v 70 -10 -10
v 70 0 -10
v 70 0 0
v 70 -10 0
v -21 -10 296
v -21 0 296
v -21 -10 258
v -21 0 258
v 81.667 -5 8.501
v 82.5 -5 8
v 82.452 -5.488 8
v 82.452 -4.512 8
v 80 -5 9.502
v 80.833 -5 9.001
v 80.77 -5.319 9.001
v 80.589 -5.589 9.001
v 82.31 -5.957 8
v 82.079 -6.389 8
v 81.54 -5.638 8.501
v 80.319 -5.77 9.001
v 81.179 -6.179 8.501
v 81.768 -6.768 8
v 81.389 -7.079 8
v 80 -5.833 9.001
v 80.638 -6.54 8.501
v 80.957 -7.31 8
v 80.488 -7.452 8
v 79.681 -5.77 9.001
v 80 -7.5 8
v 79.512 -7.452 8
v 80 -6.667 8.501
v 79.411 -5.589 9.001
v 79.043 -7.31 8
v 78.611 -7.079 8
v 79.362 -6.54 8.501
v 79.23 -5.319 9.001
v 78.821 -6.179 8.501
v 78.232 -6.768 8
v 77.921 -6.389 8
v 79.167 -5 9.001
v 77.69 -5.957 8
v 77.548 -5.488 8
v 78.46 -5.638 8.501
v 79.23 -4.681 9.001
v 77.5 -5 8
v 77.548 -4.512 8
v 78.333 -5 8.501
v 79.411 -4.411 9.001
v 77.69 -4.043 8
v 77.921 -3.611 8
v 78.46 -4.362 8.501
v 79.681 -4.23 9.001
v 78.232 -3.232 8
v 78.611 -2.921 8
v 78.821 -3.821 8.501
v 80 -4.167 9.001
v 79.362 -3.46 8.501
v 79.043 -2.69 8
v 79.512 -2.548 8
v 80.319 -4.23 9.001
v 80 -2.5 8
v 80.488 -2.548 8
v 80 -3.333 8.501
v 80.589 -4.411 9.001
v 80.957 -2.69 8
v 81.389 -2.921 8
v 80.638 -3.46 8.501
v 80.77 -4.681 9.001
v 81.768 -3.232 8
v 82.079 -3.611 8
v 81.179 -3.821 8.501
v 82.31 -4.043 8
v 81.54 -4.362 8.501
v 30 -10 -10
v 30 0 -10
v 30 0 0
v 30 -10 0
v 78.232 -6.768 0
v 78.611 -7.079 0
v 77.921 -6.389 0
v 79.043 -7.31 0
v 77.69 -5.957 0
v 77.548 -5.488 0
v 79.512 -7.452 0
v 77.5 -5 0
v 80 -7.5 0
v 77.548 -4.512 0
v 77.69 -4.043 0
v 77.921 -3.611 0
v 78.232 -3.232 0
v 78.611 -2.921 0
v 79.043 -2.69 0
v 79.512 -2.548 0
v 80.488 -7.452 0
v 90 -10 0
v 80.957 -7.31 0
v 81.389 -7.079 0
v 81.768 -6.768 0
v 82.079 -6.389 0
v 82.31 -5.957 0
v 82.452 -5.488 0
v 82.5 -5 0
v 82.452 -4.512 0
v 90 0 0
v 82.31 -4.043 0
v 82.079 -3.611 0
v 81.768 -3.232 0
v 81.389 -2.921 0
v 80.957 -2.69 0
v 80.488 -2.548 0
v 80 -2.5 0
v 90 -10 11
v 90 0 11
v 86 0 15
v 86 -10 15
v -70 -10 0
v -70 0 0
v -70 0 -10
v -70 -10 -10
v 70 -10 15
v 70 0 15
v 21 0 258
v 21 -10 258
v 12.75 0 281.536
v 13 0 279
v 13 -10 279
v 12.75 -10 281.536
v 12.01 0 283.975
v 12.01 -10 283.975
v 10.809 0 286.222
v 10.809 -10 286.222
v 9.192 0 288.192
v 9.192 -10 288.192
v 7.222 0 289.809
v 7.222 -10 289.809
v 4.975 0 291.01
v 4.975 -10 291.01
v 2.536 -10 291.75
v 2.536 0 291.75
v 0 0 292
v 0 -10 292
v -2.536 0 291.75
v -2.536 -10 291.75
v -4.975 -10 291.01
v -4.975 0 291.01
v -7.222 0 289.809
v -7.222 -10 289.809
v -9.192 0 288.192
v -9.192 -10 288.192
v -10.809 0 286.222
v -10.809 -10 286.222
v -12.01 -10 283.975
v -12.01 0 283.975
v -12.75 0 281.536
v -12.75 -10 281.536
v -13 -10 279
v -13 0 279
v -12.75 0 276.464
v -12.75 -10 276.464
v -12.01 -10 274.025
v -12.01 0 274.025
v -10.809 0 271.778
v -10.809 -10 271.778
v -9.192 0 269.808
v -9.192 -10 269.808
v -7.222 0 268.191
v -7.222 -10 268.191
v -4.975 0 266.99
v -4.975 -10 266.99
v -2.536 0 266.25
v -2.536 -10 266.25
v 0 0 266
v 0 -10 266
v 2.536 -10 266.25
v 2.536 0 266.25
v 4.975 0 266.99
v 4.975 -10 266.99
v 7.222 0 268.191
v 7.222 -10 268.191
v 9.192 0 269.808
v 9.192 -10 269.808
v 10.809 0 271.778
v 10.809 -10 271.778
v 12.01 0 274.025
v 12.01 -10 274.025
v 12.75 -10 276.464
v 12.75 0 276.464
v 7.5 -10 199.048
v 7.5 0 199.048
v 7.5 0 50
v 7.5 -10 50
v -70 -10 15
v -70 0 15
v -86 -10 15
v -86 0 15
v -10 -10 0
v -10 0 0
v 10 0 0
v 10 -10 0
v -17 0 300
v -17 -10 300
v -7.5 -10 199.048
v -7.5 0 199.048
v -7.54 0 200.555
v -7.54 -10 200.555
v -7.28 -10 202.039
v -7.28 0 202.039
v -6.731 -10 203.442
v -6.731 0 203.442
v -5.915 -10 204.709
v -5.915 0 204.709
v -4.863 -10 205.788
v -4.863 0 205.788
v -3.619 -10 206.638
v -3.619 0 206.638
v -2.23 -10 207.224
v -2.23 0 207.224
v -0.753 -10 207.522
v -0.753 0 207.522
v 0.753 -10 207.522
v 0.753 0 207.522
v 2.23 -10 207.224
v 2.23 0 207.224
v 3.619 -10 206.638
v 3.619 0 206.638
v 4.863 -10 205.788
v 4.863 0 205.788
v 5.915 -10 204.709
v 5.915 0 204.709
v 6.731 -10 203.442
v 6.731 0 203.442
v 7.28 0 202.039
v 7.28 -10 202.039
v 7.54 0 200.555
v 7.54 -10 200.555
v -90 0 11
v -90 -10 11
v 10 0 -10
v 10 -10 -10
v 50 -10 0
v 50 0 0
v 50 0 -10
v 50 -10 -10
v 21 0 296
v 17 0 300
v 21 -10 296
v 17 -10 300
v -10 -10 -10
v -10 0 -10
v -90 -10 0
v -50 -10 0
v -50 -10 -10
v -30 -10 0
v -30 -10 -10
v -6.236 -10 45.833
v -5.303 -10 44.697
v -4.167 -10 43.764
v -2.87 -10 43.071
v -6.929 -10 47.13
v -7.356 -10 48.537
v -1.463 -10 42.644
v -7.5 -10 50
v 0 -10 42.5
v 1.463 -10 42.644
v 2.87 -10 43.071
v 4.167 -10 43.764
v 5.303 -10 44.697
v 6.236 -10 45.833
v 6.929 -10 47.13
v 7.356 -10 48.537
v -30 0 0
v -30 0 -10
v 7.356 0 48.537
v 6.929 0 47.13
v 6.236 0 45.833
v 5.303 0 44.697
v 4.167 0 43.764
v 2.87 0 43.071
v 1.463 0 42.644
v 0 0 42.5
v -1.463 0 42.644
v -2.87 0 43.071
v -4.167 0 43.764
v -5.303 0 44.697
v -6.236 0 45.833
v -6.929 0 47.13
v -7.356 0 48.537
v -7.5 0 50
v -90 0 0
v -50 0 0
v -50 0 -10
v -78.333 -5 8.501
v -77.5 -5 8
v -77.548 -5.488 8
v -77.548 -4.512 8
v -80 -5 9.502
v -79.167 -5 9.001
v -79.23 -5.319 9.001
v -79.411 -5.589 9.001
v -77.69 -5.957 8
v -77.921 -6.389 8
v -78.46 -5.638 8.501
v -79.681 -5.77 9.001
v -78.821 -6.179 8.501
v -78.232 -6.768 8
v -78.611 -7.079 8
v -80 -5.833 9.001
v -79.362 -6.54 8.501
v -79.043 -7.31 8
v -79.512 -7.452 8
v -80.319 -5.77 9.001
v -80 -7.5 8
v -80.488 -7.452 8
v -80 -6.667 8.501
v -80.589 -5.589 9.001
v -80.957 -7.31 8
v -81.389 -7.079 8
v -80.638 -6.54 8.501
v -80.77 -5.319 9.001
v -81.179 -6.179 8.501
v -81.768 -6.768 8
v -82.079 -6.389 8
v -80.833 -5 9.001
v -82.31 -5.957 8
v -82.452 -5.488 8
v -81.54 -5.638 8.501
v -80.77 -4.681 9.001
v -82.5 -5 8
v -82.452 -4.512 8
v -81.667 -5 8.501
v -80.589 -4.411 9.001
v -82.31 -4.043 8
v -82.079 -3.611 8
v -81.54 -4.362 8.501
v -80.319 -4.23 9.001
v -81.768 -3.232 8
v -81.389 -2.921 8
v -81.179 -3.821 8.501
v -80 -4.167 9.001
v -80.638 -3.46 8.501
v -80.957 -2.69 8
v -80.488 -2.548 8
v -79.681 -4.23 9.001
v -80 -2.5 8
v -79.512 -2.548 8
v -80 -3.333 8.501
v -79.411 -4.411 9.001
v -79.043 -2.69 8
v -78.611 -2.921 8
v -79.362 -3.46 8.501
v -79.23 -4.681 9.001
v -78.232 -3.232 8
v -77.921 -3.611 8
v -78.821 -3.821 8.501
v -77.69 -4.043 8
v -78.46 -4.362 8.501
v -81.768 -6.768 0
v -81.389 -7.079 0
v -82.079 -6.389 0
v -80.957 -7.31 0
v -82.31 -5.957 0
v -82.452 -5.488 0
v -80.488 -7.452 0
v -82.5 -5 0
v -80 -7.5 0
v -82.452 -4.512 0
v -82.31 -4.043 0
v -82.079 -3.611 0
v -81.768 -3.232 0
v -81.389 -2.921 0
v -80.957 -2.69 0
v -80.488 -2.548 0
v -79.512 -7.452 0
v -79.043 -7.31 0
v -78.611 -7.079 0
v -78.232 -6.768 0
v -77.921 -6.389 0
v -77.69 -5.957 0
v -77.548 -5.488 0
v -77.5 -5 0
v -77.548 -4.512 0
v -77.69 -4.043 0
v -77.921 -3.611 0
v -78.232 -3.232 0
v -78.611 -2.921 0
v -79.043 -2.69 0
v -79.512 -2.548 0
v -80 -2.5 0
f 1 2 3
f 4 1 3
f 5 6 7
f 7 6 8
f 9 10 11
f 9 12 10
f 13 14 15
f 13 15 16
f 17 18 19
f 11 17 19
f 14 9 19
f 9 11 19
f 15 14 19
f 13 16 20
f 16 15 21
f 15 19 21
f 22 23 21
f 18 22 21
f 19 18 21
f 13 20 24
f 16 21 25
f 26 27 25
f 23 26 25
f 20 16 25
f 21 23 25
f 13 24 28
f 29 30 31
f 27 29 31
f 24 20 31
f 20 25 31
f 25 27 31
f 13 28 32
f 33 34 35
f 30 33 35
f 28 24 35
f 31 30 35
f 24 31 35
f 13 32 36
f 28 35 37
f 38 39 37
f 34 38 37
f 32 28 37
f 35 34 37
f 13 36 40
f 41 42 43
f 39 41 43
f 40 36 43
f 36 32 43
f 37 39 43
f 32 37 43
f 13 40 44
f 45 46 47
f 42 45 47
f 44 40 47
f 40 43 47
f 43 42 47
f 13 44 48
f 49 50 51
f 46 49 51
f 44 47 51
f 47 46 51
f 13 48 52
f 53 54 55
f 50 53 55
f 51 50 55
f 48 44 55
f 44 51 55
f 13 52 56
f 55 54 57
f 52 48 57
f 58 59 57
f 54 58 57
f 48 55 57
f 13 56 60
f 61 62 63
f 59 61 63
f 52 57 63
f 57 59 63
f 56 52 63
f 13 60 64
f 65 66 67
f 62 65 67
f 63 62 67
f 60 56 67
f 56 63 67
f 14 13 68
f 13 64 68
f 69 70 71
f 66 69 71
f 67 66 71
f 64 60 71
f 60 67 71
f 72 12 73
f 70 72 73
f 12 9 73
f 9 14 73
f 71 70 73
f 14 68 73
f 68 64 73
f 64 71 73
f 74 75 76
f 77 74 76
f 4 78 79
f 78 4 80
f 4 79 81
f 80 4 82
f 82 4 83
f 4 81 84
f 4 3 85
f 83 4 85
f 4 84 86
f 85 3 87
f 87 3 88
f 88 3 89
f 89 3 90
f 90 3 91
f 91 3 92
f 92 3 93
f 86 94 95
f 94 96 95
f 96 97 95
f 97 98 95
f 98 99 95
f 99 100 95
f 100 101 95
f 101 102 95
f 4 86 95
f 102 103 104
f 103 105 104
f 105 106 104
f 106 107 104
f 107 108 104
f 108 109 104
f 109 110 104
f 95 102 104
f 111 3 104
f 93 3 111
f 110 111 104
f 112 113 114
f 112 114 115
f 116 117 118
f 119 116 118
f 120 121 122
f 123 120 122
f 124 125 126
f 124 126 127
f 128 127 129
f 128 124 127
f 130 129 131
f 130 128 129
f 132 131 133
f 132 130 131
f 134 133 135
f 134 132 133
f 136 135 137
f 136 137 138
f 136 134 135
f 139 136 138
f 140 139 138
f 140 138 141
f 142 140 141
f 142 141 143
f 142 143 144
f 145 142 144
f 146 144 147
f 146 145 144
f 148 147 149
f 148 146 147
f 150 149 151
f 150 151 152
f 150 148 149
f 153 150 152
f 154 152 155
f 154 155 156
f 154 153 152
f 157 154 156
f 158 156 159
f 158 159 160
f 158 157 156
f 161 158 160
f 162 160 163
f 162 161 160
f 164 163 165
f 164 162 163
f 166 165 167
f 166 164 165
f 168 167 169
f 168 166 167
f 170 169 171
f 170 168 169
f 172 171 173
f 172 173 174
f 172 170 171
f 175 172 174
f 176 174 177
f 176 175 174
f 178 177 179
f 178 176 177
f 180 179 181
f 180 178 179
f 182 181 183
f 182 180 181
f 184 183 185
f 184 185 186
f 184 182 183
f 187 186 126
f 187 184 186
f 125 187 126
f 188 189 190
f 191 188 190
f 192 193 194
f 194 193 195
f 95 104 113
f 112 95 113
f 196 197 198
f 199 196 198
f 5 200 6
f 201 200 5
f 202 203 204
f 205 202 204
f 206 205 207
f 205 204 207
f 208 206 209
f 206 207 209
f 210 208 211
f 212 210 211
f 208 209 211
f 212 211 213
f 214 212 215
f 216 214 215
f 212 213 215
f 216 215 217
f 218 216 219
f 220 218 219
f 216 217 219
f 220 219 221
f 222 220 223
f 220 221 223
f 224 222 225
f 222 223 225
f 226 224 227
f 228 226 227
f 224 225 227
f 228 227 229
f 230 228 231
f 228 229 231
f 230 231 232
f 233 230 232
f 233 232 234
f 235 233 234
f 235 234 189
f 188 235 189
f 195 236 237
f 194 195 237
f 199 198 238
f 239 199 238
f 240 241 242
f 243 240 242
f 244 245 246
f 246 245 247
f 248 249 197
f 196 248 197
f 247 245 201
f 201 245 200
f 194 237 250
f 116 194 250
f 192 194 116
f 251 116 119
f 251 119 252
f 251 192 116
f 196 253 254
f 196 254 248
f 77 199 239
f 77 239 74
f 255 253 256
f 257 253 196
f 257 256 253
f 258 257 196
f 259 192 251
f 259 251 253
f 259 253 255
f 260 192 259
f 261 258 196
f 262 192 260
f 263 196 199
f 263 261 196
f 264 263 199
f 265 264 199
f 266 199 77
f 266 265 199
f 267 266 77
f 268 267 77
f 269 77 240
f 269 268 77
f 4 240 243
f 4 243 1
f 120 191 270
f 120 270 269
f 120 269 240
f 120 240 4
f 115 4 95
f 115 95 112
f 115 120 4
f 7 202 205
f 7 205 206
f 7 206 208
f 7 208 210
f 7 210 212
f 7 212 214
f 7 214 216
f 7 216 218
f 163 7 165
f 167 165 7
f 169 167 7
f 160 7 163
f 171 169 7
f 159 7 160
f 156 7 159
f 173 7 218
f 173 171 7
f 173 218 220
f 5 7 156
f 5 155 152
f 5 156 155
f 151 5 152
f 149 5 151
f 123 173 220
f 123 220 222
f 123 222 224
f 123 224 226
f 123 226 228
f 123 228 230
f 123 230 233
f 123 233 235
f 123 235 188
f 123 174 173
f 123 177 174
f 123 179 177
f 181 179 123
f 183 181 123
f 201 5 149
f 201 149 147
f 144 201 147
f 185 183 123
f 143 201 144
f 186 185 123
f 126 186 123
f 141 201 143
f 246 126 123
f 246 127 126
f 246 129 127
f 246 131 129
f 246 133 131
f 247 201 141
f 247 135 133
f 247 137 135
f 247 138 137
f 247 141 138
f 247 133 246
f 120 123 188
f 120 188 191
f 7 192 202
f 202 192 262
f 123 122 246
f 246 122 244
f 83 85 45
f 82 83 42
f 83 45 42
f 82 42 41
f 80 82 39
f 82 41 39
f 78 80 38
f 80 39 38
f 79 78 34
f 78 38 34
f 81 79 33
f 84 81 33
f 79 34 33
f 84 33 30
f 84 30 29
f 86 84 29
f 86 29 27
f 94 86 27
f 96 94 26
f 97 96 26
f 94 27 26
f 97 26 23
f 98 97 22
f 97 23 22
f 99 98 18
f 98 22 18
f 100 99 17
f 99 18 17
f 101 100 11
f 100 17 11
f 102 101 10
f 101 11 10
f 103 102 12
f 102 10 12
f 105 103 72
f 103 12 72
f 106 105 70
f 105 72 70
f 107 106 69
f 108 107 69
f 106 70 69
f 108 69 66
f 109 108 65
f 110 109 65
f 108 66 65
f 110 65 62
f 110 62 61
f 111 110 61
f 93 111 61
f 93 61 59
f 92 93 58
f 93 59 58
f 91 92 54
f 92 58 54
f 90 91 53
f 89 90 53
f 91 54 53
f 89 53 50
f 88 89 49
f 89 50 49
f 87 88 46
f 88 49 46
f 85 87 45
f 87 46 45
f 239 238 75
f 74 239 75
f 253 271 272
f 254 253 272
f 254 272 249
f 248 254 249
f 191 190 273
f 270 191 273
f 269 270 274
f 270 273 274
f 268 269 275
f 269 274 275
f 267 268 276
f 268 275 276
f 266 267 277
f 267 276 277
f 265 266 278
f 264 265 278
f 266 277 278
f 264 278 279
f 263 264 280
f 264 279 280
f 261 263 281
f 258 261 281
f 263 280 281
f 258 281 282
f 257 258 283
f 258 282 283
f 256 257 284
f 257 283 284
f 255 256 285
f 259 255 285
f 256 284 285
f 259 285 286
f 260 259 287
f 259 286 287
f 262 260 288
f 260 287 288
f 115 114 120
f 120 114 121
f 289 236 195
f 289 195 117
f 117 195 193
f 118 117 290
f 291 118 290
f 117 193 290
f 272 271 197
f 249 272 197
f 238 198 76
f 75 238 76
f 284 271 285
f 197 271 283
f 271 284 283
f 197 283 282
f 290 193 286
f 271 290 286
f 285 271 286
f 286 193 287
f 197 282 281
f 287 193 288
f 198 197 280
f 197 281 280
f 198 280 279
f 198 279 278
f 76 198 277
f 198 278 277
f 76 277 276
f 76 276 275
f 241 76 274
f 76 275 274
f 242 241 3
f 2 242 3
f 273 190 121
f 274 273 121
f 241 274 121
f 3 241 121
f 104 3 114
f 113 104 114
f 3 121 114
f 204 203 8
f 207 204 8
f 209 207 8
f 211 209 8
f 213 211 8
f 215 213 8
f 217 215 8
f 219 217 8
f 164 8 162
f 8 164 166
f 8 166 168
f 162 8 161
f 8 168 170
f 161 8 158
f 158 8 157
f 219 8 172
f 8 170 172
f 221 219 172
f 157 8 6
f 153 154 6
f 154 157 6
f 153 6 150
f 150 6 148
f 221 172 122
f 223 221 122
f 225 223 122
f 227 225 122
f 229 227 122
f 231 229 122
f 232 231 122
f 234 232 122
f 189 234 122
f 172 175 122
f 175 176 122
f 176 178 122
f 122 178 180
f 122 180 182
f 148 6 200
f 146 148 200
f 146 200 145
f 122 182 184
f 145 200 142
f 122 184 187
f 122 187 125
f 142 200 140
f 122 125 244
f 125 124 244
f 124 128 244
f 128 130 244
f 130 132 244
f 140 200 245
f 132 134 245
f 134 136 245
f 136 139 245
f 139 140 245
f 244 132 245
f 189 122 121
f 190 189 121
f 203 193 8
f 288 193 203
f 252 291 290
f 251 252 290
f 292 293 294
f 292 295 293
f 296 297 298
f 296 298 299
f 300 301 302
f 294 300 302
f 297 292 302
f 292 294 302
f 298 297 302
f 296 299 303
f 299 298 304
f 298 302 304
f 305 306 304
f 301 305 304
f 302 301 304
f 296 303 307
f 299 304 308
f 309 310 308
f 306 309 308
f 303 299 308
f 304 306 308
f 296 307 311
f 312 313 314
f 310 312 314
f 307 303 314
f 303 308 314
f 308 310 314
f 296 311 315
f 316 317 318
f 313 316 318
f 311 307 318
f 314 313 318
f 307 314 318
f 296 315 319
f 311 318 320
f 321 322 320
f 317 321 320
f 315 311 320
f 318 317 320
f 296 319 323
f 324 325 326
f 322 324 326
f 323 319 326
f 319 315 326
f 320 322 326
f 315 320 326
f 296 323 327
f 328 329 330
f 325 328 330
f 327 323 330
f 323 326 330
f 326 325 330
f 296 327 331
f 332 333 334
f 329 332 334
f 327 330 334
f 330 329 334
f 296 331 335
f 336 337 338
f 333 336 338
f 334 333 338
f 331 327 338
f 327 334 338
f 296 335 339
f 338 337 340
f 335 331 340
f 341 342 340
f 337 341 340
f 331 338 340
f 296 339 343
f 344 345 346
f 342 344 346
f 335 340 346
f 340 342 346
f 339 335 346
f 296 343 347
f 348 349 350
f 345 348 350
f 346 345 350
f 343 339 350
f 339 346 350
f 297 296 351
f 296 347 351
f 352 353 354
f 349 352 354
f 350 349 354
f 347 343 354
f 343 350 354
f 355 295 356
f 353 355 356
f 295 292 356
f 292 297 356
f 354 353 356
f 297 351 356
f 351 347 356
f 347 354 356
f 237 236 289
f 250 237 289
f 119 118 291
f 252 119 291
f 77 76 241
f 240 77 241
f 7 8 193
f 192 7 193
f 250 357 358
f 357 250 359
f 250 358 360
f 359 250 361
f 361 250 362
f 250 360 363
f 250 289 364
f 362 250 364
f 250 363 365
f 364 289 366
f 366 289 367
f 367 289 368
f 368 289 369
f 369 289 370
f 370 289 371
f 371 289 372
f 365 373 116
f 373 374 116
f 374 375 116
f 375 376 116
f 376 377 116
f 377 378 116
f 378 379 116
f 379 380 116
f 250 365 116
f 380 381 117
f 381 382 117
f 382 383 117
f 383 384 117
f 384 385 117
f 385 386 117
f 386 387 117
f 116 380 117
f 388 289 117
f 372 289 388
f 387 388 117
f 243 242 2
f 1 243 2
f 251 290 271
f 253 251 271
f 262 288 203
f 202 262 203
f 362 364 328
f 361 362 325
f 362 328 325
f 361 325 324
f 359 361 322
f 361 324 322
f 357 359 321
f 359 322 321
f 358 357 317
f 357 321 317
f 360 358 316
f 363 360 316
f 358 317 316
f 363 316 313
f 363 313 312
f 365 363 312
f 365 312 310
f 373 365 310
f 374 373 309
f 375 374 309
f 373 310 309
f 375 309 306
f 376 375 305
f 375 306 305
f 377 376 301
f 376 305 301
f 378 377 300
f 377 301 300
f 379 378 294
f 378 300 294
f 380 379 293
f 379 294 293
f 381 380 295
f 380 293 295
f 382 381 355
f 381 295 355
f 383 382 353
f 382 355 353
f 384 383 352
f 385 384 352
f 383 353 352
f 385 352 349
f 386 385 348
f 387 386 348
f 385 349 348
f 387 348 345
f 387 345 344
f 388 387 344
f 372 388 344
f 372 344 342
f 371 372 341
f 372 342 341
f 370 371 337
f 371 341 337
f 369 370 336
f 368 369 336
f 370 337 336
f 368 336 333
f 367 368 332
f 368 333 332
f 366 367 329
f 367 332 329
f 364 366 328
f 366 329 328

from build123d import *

# Parameters (mm, degrees)
F0_R     = 13
F1_DEPTH = 10
F2_SIZE  = 4
F3_SIZE  = 4
F5_D     = 5
F5_DEPTH = 8
F5_TIP   = 1.5021515476


with BuildPart() as f1:
    # F0 (on Front) → F1 (new body)
    with BuildSketch(Plane.XZ):
        Polygon((-10, 0), (0, 0), (10, 0), (10, -10), (30, -10), (30, 0), (50, 0), (50, -10), (70, -10), (70, 0), (90, 0), (90, 15), (70, 15), (21, 258), (21, 300), (0, 300), (-21, 300), (-21, 258), (-70, 15), (-90, 15), (-90, 0), (-70, 0), (-70, -10), (-50, -10), (-50, 0), (-30, 0), (-30, -10), (-10, -10), align=None)
        with BuildLine():
            ThreePointArc((7.5, 50), (0, 42.5), (-7.5, 50))
            Line((-7.5, 50), (-7.5, 199.0483840028))
            ThreePointArc((-7.5, 199.0483840028), (0, 207.5601304887), (7.5, 199.0483840028))
            Line((7.5, 199.0483840028), (7.5, 50))
        make_face(mode=Mode.SUBTRACT)
        with Locations((0, 279)):
            Circle(F0_R, mode=Mode.SUBTRACT)
    extrude(amount=F1_DEPTH)

    # F2
    f2_edges = [f1.edges().sort_by_distance(p)[0] for p in [
        (21, -5, 300),
        (-21, -5, 300),
    ]]
    chamfer(f2_edges, length=F2_SIZE)

    # F3
    f3_edges = [f1.edges().sort_by_distance(p)[0] for p in [
        (-90, -5, 15),
        (90, -5, 15),
    ]]
    chamfer(f3_edges, length=F3_SIZE)

    # F5
    with Locations(Plane(origin=(0, 0, 0), x_dir=(1, 0, 0), z_dir=(0, 0, -1))):
        with Locations((-80, 5), (80, 5)):
            Hole(F5_D / 2, depth=F5_DEPTH)
            with Locations((0, 0, -(F5_DEPTH + F5_TIP / 2))):  # 118° drill point
                Cone(0, F5_D / 2, F5_TIP, mode=Mode.SUBTRACT)


solid = f1.part
